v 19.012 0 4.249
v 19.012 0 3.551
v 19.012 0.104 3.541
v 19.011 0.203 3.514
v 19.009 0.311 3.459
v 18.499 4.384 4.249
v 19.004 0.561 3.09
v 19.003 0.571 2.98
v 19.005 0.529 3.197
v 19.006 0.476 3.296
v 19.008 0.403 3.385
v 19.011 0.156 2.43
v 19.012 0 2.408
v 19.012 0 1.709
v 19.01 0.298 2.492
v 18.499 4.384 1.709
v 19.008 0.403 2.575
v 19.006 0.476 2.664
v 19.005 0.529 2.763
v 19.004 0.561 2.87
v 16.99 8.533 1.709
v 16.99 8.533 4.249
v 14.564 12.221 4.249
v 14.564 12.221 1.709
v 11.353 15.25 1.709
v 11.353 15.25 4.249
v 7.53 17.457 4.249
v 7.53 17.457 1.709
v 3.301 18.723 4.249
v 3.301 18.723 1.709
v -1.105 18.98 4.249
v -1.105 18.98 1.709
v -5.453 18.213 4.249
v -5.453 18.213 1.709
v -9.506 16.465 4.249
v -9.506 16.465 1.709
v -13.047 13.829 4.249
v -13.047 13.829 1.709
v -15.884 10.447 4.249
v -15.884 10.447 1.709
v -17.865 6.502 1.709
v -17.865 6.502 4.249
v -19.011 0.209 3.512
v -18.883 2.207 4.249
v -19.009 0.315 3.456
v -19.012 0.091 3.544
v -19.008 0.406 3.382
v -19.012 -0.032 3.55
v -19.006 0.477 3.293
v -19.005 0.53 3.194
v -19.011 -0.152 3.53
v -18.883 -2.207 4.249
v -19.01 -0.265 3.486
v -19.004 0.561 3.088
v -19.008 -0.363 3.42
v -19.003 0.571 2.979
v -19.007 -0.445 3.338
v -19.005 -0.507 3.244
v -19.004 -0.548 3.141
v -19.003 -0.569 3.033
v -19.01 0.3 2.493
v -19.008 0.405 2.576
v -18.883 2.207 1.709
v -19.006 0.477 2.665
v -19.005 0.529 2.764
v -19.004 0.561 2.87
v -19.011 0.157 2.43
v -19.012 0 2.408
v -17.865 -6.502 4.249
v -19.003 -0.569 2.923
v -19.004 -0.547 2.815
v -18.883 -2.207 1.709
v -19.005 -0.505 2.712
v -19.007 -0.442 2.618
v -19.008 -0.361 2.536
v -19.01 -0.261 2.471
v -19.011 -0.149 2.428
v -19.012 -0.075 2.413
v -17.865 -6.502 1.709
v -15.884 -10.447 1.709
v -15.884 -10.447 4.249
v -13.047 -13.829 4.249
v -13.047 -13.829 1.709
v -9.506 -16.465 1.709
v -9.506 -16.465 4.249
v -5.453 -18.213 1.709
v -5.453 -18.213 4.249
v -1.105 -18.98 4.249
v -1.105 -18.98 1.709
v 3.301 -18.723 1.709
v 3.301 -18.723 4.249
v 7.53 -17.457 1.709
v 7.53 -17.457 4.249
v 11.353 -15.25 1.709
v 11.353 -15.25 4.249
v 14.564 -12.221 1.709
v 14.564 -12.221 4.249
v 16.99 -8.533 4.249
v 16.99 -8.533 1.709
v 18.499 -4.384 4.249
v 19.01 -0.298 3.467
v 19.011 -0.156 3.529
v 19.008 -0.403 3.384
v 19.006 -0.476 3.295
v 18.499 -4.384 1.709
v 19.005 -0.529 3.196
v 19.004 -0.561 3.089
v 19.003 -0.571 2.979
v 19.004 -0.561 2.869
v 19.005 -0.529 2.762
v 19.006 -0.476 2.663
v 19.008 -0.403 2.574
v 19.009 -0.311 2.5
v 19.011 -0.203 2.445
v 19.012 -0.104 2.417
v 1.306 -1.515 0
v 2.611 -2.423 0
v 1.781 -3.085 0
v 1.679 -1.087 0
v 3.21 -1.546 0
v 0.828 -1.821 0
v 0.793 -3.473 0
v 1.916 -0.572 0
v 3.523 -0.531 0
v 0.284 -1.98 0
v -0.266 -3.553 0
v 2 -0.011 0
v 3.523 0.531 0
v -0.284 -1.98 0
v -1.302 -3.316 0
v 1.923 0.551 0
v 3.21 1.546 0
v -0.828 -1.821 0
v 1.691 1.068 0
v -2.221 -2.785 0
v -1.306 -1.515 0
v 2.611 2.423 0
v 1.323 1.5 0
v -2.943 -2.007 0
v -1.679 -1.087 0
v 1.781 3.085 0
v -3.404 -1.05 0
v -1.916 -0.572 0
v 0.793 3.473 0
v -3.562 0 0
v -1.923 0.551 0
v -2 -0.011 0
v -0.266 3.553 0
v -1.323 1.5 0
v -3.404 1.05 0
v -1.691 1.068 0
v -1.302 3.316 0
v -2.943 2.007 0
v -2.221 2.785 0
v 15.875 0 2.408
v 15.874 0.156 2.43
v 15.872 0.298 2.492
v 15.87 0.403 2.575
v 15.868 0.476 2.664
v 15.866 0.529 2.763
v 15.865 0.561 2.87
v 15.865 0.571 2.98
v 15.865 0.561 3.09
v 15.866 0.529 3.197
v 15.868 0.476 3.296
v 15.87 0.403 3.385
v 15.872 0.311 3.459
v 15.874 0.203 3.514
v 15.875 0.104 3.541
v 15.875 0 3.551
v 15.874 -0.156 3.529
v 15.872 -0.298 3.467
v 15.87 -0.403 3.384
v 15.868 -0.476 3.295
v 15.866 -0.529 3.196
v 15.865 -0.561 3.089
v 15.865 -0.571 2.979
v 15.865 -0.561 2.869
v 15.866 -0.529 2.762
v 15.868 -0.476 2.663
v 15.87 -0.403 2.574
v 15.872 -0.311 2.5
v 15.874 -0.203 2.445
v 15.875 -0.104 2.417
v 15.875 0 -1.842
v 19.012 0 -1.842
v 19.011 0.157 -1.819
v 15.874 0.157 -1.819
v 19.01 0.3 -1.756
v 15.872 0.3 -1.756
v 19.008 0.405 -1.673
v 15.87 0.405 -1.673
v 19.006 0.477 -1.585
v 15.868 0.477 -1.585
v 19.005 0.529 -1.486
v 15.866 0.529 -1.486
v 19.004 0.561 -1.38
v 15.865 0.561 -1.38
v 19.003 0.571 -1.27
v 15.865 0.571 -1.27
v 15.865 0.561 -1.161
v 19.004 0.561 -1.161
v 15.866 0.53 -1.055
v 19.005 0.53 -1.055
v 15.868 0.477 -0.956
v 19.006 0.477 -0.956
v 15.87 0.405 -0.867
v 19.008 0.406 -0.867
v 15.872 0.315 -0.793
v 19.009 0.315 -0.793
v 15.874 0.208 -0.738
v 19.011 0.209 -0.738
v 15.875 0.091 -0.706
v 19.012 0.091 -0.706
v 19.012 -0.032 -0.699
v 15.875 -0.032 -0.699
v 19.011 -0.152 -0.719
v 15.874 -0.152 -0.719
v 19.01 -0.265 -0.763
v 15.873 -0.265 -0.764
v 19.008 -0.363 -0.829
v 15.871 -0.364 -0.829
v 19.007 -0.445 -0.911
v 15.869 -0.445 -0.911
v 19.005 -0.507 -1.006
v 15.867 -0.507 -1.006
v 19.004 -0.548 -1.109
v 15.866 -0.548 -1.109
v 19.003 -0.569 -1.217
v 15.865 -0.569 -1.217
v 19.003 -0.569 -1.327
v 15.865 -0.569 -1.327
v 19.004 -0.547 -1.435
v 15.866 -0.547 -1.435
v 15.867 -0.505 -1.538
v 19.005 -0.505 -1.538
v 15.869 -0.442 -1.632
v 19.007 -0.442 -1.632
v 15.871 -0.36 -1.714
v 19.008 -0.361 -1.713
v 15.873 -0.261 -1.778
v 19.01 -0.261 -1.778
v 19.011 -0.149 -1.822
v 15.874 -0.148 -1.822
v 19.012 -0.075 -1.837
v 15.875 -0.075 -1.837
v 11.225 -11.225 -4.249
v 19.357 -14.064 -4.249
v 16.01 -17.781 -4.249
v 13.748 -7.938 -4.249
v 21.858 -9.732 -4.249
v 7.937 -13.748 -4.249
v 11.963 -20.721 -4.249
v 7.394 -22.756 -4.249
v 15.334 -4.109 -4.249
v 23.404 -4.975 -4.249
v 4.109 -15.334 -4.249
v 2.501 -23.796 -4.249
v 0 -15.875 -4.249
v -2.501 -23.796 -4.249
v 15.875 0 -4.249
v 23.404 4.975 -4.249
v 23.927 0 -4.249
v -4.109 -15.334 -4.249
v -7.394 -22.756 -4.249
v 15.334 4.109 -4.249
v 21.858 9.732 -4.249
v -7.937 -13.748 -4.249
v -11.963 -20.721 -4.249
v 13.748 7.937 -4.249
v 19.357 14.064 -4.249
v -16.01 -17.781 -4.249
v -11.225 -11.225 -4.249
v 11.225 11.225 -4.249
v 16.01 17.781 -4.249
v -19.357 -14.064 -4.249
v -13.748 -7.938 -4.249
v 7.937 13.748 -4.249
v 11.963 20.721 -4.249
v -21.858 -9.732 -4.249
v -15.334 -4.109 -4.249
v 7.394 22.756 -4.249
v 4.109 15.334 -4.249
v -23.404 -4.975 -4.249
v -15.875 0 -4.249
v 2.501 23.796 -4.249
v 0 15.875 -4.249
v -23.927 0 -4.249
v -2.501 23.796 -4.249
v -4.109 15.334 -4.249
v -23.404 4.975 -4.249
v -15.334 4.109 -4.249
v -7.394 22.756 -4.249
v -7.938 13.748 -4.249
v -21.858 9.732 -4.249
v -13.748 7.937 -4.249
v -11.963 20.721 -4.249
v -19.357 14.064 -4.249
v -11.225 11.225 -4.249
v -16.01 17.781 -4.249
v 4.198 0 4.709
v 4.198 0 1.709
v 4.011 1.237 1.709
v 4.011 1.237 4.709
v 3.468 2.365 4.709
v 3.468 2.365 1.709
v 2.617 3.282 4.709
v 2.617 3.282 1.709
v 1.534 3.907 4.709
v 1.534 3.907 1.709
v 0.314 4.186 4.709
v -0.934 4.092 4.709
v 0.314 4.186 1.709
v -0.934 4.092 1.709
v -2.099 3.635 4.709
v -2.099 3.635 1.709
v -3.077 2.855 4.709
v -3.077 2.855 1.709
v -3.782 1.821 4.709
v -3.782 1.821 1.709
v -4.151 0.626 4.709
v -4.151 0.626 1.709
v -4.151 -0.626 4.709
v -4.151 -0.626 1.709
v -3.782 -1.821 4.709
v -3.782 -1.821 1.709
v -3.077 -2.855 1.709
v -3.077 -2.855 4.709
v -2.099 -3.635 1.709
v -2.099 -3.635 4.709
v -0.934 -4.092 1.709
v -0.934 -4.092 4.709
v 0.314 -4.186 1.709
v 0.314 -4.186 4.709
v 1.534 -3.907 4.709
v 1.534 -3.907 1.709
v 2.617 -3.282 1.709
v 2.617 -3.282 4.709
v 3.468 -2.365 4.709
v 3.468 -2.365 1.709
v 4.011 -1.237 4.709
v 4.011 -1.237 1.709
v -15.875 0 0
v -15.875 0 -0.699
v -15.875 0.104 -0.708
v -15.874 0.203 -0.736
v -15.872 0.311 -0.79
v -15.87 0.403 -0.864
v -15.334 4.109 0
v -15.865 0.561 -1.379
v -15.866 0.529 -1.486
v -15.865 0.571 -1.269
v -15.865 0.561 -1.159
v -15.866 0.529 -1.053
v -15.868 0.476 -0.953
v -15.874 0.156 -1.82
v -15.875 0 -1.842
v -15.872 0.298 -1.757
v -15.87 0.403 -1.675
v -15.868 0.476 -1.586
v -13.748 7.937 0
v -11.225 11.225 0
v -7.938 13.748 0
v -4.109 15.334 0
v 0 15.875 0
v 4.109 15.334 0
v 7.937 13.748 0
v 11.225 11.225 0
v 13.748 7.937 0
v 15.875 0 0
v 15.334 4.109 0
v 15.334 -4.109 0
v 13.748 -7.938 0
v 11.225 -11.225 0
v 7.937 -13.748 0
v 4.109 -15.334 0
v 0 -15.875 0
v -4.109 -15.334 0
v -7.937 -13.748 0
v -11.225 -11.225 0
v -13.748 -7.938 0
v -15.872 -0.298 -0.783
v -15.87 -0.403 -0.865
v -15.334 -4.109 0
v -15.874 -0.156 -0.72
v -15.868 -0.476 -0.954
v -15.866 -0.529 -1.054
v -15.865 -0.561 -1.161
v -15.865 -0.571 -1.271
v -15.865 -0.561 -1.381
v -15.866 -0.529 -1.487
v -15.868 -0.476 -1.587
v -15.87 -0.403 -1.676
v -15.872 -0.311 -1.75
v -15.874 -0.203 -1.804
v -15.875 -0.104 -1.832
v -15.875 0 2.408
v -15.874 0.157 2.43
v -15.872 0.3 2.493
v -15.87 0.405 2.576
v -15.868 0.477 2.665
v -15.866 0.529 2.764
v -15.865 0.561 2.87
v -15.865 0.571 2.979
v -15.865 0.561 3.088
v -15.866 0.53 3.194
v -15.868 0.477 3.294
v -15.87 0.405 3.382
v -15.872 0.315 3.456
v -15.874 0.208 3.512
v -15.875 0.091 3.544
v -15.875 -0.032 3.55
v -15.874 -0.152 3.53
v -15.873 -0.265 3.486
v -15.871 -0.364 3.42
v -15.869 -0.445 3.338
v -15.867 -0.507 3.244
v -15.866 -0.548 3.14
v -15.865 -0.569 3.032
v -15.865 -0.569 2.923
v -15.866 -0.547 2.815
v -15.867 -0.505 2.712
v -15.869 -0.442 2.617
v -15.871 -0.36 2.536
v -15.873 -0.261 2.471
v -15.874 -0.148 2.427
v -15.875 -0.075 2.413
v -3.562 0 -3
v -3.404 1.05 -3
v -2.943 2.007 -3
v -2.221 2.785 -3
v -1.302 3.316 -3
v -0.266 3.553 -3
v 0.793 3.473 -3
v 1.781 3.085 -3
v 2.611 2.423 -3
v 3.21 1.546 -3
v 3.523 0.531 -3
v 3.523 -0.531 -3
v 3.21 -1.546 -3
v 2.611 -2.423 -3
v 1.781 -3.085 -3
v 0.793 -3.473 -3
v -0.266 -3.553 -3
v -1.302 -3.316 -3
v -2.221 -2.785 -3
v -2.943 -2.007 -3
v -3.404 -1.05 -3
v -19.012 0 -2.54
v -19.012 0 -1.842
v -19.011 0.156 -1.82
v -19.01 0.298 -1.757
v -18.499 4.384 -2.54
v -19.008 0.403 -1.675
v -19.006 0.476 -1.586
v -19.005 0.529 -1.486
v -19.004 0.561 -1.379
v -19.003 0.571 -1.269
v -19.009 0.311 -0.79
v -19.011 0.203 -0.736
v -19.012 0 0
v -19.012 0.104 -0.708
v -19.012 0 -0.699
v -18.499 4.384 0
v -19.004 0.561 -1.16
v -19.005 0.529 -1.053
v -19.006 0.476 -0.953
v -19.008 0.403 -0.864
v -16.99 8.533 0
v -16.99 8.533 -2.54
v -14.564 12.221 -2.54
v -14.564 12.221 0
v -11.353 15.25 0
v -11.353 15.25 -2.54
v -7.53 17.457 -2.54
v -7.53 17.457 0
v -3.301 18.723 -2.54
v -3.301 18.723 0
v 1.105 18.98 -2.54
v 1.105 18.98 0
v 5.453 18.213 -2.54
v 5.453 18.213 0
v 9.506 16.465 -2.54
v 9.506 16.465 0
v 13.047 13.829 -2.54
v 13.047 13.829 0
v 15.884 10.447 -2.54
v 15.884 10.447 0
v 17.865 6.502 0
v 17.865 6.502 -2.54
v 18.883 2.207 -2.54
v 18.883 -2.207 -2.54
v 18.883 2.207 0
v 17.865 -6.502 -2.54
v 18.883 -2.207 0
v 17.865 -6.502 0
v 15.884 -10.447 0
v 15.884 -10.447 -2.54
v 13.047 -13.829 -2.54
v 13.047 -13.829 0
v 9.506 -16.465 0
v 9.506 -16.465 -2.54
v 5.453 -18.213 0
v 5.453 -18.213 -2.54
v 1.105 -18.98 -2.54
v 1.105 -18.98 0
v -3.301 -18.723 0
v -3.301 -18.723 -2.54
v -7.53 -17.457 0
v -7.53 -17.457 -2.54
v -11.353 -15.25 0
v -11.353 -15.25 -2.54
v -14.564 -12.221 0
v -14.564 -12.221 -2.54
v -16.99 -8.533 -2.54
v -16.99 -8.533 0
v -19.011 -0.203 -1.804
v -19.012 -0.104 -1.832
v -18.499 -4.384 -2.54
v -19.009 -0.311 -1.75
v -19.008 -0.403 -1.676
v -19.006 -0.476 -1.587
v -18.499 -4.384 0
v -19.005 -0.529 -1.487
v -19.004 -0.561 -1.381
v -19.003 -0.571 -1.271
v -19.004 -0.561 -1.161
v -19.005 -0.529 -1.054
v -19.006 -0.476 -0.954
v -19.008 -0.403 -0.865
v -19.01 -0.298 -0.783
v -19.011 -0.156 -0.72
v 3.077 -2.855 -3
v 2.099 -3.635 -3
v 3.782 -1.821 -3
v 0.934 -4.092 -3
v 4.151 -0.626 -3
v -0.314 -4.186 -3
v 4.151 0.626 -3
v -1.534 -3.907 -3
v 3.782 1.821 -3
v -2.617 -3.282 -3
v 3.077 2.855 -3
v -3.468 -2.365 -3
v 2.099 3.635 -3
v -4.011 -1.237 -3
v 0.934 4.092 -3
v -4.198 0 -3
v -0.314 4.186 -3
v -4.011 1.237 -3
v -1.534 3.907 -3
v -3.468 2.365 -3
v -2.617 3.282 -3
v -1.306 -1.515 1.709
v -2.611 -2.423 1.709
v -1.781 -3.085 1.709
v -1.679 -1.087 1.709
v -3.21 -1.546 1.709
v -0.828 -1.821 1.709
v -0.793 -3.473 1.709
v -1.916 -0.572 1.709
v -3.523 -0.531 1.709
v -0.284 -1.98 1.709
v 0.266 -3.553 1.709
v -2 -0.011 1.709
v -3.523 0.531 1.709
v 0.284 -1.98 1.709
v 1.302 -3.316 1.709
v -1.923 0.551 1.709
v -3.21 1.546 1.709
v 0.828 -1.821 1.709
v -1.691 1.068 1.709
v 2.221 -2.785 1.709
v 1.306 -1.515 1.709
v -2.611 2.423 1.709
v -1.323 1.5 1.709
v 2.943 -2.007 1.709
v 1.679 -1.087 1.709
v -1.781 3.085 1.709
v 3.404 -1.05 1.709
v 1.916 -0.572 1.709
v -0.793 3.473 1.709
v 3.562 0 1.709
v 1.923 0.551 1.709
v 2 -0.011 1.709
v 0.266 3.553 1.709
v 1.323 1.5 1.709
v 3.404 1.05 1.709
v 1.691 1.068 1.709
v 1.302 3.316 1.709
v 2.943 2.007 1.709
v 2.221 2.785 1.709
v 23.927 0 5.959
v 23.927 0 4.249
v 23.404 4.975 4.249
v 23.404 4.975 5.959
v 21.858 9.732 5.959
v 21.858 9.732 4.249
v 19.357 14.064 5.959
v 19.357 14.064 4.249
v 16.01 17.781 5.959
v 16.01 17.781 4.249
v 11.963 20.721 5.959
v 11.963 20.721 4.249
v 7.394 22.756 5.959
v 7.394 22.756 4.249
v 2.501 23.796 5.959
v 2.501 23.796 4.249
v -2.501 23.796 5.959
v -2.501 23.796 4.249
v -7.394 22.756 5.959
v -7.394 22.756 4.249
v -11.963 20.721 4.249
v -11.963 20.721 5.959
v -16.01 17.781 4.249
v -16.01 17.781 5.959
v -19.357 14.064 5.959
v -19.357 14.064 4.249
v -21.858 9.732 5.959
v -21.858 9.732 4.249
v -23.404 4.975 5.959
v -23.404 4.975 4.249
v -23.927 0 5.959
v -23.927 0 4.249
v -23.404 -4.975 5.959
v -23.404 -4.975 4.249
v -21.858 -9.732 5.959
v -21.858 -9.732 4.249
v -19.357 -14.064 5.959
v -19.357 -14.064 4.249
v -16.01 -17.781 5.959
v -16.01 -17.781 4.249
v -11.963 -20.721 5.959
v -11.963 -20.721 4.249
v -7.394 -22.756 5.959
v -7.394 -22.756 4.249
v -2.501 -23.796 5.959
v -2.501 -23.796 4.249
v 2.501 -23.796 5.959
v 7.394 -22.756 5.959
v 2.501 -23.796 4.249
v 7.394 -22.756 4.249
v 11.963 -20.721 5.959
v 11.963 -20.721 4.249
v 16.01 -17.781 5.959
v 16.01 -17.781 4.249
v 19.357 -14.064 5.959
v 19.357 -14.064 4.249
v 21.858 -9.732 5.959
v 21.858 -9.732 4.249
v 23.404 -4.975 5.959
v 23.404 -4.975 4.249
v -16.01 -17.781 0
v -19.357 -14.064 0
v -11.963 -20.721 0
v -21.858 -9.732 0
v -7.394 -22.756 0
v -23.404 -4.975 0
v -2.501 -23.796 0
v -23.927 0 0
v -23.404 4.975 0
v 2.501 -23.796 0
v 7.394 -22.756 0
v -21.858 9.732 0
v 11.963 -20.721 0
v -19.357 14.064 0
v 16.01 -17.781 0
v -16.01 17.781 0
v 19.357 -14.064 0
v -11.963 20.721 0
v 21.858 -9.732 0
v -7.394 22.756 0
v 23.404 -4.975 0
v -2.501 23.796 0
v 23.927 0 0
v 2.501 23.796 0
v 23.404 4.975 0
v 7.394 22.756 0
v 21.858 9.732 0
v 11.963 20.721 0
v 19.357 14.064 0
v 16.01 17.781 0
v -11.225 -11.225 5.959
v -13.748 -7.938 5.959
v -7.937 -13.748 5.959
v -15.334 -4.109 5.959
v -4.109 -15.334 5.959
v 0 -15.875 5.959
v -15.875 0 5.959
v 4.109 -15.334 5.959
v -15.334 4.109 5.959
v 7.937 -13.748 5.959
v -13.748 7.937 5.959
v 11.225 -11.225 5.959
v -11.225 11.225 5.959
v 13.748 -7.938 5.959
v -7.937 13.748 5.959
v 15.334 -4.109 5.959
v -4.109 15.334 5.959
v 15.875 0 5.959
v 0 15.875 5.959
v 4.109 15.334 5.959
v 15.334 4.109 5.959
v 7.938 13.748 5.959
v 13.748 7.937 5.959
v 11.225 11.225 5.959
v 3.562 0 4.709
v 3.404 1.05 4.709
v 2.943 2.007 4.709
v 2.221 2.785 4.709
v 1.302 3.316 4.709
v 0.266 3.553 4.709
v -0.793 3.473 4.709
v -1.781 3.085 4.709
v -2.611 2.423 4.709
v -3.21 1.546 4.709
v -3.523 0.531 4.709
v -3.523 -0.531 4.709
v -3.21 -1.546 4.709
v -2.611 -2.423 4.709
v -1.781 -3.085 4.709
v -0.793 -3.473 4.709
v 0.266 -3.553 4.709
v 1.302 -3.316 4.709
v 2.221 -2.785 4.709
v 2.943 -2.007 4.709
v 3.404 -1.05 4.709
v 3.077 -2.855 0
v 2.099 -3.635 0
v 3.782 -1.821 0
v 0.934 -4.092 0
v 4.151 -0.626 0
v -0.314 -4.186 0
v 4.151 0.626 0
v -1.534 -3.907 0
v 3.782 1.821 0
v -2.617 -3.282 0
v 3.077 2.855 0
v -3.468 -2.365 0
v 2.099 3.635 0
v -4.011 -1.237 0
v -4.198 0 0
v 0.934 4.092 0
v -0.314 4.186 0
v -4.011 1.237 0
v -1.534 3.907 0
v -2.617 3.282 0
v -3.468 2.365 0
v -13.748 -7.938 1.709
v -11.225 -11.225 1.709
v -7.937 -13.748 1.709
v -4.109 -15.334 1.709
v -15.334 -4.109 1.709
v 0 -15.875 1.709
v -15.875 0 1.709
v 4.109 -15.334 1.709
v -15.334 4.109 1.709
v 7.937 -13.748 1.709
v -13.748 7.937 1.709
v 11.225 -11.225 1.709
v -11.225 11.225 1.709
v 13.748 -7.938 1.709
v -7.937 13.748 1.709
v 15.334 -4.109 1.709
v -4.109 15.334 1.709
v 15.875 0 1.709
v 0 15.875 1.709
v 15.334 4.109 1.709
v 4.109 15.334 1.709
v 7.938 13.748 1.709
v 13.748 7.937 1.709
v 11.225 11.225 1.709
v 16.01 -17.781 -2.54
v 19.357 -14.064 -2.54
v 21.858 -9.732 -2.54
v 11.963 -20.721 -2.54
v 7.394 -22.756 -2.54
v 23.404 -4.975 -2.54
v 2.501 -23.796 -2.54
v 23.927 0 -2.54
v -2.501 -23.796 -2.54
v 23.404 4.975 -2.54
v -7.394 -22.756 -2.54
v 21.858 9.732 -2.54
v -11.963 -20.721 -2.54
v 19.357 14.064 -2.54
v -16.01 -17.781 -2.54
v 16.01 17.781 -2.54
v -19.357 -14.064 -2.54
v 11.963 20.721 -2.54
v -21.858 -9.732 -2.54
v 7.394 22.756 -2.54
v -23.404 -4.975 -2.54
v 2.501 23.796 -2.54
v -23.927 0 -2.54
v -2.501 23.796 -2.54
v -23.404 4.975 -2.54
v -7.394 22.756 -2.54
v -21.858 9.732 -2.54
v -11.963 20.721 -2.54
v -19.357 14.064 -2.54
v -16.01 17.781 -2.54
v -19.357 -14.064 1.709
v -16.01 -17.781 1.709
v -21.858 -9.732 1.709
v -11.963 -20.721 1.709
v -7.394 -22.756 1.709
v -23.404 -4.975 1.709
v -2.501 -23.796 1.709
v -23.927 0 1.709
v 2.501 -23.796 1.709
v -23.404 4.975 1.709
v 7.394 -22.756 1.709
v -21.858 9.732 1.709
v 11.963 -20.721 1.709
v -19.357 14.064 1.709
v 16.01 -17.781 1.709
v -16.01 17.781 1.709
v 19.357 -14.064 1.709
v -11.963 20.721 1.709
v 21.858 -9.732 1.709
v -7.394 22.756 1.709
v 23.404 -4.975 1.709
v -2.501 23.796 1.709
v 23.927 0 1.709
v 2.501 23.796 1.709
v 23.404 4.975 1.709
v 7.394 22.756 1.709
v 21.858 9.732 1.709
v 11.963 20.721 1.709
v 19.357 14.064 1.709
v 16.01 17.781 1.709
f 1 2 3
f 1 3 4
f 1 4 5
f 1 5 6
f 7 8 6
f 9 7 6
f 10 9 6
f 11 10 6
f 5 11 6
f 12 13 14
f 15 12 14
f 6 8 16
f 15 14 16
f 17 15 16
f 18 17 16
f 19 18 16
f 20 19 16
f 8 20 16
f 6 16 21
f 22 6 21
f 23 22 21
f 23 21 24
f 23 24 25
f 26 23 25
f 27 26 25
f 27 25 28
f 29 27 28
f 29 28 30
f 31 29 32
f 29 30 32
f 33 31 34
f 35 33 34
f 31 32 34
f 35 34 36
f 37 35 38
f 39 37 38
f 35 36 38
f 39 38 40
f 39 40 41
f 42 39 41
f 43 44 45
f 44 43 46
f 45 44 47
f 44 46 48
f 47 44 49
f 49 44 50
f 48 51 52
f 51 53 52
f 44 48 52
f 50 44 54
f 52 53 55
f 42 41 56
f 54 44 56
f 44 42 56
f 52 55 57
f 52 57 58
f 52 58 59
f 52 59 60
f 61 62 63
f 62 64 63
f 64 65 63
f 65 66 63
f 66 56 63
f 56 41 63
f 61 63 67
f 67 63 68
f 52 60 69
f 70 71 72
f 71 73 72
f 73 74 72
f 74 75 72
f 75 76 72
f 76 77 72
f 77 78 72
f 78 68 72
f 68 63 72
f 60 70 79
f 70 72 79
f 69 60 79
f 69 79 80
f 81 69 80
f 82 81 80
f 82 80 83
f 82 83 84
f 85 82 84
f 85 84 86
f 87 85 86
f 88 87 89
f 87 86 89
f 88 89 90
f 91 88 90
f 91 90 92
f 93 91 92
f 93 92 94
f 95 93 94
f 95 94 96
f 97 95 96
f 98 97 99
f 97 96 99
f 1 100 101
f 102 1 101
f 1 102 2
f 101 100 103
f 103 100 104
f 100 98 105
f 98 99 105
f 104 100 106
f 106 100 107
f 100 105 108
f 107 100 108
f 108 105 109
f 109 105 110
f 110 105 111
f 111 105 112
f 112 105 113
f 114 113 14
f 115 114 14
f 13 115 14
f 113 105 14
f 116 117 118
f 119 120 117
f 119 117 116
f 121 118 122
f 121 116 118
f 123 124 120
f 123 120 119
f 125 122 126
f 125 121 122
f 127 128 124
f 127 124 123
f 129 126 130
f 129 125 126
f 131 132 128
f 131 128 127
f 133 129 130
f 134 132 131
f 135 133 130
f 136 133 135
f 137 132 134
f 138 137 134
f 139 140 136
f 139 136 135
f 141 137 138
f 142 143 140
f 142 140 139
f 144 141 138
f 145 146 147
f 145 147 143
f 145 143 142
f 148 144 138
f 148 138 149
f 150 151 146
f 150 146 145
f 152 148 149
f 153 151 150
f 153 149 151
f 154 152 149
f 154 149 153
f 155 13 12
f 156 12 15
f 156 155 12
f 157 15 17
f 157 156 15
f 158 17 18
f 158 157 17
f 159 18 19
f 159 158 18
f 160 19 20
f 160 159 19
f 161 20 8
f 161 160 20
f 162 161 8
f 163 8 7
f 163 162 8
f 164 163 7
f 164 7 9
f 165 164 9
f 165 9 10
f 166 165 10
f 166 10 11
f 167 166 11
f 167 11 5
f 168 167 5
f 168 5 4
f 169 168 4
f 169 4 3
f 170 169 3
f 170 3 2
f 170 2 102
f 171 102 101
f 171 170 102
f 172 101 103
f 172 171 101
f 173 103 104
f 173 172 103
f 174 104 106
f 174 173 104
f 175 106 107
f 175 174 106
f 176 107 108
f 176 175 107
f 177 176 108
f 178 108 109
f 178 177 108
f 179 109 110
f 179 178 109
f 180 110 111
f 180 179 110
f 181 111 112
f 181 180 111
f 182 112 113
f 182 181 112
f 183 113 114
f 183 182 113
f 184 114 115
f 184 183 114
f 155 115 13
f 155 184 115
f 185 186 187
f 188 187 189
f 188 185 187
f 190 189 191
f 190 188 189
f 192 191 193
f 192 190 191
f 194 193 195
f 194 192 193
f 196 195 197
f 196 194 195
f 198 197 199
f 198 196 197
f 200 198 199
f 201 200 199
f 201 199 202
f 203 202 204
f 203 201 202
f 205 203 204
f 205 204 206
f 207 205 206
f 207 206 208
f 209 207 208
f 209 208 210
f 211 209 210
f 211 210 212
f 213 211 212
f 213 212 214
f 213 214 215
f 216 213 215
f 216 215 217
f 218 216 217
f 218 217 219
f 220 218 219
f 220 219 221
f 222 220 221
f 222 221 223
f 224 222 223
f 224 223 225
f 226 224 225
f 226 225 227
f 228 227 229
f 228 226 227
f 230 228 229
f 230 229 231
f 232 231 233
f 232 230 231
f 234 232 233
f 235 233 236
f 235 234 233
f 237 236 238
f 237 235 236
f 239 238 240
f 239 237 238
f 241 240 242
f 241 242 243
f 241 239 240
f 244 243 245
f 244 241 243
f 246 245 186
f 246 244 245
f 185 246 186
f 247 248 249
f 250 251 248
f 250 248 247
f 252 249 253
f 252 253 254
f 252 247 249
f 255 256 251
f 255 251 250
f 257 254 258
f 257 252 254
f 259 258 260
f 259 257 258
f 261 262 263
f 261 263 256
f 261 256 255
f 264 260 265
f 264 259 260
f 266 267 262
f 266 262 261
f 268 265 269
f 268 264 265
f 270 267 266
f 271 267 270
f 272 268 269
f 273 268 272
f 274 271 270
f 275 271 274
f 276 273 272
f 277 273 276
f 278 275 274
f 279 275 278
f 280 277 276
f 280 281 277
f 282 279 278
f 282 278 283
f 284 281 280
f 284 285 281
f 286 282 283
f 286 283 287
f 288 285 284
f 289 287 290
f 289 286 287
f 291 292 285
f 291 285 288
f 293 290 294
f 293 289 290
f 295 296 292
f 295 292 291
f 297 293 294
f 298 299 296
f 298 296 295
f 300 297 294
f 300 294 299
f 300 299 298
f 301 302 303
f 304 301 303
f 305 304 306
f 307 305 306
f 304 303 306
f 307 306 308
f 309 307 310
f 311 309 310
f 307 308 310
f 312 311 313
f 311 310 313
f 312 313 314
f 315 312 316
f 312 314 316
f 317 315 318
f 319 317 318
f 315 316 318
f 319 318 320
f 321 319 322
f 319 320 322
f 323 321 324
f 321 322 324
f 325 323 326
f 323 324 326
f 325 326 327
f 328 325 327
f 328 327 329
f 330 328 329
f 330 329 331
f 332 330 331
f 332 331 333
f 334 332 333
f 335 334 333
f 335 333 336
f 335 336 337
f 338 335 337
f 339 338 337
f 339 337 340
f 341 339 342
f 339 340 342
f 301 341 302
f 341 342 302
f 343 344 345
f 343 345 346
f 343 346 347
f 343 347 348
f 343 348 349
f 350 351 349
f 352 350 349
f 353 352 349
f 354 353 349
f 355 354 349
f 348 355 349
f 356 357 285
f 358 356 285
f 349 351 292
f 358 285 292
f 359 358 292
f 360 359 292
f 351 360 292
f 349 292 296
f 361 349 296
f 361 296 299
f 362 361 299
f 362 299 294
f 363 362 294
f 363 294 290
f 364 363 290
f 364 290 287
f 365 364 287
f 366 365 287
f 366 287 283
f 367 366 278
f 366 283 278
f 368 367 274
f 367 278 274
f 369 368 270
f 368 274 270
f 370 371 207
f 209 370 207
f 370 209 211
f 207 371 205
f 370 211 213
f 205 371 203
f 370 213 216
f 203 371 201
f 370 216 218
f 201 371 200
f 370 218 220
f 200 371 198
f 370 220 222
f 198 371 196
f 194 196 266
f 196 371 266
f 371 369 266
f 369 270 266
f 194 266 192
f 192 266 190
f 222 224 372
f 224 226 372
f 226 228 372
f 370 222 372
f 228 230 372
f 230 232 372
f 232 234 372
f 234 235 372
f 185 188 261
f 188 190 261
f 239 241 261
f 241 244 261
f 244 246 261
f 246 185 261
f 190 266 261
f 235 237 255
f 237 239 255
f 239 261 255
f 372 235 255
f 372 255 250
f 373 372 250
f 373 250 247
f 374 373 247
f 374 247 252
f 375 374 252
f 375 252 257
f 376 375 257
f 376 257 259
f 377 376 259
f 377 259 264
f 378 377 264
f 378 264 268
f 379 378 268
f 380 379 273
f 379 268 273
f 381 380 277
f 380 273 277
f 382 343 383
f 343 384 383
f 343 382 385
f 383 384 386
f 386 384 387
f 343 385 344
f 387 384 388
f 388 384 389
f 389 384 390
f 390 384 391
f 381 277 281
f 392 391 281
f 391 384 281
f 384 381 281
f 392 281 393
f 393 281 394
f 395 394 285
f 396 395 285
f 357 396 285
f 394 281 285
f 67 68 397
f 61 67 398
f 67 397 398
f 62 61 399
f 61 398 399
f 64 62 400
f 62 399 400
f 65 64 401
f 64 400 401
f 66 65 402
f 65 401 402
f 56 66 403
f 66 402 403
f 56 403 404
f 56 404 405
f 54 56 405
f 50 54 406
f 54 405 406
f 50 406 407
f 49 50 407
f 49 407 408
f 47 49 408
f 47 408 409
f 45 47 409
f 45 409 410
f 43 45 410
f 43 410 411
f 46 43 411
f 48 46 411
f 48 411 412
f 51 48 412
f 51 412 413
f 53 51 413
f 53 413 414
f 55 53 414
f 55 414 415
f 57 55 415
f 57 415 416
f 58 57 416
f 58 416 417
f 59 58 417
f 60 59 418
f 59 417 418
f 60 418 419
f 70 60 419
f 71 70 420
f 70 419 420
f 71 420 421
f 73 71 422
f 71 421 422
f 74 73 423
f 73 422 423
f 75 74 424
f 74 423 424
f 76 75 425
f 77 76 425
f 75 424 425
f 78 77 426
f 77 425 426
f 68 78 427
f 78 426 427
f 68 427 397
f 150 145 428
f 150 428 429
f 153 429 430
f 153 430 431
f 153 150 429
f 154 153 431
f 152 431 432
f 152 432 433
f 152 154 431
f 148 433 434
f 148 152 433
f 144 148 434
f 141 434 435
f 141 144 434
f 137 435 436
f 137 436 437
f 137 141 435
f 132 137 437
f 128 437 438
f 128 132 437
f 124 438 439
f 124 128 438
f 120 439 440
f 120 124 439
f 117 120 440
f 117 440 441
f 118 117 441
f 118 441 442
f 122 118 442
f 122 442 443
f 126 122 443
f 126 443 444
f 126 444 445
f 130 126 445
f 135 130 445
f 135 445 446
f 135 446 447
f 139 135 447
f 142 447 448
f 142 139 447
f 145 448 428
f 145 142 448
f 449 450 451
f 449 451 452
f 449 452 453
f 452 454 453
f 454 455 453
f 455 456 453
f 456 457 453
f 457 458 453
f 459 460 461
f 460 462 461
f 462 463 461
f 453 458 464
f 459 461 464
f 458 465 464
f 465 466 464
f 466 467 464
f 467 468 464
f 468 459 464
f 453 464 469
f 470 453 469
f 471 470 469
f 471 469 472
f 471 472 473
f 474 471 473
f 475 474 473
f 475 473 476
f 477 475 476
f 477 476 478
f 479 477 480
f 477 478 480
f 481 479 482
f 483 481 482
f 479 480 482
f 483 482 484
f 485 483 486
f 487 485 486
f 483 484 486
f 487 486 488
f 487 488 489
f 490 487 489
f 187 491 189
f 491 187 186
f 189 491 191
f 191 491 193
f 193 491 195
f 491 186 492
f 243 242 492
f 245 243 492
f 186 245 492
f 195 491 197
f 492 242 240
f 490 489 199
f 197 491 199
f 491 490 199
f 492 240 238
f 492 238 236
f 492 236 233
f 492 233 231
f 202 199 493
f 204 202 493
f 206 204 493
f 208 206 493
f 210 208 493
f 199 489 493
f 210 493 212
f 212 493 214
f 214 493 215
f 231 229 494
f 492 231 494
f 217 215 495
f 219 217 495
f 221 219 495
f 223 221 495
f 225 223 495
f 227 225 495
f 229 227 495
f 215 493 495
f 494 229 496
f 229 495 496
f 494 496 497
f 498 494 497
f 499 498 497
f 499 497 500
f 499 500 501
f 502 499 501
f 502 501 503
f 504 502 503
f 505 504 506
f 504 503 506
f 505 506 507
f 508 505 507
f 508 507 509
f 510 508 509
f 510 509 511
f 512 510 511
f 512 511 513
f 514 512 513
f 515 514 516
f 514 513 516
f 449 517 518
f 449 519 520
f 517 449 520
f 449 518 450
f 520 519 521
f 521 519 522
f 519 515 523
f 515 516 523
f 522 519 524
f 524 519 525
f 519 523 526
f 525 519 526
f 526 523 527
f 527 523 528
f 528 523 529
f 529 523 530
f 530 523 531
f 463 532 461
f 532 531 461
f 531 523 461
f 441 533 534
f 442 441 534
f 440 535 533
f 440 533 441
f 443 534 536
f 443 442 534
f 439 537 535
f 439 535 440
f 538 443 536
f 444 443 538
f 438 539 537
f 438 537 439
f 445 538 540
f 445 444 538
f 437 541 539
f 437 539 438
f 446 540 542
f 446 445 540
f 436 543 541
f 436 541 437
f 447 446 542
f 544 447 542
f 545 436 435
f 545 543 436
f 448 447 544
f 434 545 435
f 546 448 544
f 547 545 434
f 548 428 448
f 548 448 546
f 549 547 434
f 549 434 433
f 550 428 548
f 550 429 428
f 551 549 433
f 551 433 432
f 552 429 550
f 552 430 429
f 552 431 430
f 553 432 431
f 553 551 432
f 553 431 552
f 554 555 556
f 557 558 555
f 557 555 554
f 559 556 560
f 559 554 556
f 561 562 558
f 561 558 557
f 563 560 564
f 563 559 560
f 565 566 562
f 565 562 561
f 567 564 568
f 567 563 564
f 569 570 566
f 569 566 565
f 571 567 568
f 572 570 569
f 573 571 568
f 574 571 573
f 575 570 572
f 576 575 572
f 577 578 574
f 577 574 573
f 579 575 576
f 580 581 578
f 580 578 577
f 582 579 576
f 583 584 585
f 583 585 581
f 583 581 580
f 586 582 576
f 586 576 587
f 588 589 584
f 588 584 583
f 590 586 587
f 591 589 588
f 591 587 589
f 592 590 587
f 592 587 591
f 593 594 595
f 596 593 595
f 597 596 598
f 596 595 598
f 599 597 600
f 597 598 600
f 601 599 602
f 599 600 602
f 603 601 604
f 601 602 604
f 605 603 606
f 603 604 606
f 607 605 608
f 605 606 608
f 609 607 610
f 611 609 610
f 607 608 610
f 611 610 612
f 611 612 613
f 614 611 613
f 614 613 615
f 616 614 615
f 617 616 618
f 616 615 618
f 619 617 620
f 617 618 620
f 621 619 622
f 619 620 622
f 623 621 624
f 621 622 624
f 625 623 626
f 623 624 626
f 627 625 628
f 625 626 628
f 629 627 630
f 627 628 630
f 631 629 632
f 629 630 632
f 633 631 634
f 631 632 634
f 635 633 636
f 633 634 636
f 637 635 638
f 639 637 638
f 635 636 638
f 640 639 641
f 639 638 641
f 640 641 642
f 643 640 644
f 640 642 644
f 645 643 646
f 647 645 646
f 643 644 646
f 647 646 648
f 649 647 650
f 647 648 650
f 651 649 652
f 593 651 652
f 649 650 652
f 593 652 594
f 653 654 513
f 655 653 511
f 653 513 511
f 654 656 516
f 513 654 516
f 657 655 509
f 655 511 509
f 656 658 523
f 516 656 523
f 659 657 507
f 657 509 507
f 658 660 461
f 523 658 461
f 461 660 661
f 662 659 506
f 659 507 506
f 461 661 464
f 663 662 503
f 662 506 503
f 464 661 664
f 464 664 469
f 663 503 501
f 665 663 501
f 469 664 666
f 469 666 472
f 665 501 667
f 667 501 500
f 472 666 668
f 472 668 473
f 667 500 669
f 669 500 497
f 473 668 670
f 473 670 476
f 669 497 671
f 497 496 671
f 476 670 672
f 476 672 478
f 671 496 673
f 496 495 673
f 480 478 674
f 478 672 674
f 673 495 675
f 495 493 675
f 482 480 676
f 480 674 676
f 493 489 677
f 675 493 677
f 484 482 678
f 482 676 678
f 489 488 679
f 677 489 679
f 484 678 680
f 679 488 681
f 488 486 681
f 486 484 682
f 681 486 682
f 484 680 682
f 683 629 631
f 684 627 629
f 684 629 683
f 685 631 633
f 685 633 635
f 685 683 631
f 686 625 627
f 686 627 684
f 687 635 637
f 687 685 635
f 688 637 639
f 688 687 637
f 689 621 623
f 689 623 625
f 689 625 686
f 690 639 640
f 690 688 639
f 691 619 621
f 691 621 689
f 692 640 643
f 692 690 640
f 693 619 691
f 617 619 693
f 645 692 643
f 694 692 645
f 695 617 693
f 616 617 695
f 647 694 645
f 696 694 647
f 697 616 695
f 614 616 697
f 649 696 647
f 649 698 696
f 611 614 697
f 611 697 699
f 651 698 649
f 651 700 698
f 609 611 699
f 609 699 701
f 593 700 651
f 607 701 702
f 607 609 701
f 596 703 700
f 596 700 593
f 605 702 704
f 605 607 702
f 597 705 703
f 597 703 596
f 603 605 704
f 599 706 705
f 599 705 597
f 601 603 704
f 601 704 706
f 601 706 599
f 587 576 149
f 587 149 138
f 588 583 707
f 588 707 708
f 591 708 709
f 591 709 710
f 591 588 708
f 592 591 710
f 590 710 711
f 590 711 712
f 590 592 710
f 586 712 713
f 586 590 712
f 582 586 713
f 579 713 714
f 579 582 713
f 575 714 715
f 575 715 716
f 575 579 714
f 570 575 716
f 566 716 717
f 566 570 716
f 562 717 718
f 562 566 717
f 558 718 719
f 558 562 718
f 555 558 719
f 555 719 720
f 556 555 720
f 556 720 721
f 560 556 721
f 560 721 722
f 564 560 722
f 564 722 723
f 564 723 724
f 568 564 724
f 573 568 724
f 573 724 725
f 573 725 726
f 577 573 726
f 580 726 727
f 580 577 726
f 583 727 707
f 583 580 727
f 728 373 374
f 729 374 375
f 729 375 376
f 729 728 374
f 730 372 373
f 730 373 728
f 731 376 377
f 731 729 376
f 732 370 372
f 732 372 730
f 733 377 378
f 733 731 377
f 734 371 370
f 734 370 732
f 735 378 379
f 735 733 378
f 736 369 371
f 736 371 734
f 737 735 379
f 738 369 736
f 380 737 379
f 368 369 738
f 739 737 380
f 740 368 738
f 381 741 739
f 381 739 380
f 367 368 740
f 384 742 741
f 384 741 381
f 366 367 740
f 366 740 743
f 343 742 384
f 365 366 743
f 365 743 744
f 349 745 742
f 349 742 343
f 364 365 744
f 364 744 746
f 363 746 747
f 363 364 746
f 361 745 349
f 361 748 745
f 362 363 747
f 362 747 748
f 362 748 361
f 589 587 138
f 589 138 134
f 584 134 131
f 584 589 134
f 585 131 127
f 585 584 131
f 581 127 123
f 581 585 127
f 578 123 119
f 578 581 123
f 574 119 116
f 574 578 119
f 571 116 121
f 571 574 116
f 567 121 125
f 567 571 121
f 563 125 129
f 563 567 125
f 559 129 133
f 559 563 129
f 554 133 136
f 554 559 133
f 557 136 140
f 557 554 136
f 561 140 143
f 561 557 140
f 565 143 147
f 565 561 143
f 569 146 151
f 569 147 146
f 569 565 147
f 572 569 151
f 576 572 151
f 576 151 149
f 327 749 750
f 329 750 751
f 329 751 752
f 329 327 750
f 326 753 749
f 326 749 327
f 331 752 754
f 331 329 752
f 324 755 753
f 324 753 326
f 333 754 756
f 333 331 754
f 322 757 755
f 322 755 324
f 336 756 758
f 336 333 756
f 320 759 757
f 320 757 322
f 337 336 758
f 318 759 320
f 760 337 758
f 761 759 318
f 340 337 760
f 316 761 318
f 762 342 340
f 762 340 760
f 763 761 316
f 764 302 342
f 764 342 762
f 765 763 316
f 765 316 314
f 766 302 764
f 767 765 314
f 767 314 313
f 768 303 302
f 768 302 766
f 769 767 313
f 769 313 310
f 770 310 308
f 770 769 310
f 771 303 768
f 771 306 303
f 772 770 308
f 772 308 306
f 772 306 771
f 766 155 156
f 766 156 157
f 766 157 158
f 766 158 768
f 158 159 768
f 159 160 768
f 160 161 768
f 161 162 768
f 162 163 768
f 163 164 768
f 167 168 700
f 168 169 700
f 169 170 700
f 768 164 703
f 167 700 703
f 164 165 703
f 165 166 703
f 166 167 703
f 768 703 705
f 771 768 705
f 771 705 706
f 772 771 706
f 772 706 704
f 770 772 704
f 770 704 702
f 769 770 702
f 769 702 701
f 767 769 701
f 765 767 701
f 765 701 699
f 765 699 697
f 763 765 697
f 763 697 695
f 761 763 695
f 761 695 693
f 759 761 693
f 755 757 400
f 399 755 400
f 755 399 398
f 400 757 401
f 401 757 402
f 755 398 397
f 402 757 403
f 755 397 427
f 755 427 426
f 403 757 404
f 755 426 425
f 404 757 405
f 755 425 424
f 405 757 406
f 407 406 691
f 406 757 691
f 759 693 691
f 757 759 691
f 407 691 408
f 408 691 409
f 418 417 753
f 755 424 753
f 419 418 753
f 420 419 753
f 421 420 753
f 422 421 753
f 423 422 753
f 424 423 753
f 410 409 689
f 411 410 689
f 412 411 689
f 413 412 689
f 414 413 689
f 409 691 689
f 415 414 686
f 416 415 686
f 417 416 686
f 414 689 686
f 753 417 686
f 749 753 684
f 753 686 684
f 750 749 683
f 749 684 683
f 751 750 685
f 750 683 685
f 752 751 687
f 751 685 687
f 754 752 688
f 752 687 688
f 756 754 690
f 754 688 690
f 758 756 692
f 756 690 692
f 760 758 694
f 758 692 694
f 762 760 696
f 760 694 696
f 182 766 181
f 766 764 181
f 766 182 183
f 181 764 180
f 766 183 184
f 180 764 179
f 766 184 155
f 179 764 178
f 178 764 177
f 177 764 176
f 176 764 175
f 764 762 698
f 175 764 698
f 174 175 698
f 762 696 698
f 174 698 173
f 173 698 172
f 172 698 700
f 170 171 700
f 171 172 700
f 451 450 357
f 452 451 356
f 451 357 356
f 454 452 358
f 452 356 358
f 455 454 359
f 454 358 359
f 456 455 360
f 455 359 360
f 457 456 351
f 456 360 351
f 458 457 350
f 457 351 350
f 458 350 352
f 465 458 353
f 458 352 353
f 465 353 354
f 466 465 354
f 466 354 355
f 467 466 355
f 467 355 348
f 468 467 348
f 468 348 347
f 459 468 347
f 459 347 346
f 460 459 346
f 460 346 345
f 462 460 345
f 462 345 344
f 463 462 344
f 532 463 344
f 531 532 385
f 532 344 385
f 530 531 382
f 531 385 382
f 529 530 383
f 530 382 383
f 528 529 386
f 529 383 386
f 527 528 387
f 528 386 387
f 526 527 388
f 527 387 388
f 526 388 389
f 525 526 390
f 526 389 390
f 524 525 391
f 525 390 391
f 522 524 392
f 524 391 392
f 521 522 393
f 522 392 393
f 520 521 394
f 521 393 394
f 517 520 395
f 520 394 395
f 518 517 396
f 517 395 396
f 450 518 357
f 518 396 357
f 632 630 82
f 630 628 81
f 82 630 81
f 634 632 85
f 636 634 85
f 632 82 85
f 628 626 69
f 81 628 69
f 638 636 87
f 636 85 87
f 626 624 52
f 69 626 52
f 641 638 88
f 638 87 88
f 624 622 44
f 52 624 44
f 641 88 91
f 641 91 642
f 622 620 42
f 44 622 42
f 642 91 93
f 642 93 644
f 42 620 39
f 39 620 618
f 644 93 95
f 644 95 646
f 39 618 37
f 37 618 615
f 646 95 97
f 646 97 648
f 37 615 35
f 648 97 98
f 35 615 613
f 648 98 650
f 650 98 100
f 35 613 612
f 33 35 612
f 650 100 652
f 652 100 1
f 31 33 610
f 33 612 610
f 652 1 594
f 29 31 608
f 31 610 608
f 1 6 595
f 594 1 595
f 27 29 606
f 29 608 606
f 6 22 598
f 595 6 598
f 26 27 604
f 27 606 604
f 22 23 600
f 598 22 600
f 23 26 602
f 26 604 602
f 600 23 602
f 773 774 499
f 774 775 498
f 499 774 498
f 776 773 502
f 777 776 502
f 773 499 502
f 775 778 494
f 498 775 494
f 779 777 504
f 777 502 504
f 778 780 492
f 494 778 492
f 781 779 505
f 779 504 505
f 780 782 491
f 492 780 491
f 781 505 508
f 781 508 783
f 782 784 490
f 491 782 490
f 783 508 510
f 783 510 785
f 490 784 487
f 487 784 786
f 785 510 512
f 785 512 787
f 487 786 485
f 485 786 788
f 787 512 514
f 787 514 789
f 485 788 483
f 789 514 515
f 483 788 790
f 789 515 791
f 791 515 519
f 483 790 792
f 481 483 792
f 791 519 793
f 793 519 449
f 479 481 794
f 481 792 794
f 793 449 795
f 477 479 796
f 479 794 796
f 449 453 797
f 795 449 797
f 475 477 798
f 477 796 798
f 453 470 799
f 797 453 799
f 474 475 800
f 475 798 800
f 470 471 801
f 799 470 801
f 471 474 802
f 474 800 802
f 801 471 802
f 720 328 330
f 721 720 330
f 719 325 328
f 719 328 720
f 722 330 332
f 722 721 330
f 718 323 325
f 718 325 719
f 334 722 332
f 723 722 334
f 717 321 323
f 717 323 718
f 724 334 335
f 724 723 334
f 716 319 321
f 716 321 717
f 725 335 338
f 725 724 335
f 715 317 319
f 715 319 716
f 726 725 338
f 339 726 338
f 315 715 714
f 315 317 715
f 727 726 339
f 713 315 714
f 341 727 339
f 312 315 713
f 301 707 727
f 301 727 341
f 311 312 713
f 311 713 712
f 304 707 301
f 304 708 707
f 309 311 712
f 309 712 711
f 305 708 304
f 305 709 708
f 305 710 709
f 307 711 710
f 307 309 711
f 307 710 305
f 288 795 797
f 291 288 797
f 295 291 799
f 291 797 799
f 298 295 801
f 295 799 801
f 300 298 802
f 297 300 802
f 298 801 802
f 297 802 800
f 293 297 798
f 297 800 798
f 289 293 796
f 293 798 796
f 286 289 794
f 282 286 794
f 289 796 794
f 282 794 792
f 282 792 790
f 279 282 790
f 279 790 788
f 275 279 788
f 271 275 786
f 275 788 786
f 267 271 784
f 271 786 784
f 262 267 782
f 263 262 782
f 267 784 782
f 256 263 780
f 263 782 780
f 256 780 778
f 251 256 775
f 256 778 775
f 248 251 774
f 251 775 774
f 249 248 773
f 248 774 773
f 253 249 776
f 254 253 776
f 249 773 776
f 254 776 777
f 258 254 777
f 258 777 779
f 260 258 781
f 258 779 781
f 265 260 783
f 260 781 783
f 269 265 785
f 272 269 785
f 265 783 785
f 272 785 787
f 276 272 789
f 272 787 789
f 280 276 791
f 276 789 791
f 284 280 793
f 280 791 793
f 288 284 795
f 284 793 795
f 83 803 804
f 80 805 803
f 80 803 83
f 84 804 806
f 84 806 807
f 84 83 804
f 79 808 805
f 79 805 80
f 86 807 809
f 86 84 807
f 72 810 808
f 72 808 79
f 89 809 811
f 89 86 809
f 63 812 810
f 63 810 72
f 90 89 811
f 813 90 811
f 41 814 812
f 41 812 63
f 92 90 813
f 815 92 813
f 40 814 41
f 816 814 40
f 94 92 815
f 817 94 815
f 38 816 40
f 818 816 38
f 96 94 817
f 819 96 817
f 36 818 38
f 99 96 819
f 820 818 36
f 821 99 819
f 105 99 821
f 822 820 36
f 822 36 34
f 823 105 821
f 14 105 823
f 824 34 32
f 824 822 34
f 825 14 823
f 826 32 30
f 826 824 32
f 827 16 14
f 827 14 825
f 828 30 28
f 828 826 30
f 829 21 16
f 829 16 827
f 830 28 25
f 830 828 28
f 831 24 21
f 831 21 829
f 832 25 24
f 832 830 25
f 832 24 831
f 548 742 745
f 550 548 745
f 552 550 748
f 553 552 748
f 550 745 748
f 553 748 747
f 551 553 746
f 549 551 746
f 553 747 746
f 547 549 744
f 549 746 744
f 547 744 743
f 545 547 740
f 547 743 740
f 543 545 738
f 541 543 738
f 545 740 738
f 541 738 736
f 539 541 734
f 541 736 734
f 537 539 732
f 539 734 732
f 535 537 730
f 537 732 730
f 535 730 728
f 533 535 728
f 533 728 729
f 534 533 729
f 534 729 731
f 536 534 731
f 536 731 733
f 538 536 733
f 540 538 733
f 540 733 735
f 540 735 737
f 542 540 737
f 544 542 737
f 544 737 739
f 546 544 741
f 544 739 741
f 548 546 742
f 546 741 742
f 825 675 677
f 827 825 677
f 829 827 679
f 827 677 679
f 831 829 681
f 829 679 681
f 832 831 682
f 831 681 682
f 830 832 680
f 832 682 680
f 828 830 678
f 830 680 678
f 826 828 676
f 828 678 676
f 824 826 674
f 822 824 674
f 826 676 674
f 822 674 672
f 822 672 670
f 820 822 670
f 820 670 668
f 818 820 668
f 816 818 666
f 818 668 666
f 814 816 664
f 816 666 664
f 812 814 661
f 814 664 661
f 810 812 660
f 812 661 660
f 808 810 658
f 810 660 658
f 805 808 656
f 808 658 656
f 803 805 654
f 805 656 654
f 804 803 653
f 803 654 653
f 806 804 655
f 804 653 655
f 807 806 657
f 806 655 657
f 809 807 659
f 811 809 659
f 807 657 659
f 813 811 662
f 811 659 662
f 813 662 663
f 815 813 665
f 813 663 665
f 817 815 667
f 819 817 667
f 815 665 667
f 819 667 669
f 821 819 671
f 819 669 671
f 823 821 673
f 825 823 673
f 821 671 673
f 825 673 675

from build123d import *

# Parameters (mm, degrees)
SKETCH1_R               = 23.9268
BOSS_EXTRUDE1_DEPTH     = 1.70942
SKETCH2_R               = 19.0119
BOSS_EXTRUDE2_DEPTH     = 2.54
SKETCH3_R               = 19.0119
BOSS_EXTRUDE3_DEPTH     = 2.54
SKETCH4_R               = 23.9268
BOSS_EXTRUDE4_DEPTH     = 1.70942
SKETCH5_R               = 23.9268
BOSS_EXTRUDE5_DEPTH     = 1.70942
SKETCH6_R               = 15.875
CUT_EXTRUDE1_DEPTH      = 4.24942
SKETCH7_R               = 15.875
CUT_EXTRUDE2_DEPTH      = 4.24942
SKETCH8_R               = 0.5715
CUT_EXTRUDE3_DEPTH      = 24.9268
CUT_EXTRUDE3_DEPTH_BACK = 24.9268
CUT_EXTRUDE4_DEPTH      = 6.9588401
SKETCH10_R              = 4.1975
SKETCH10_R_2            = 3.5625
BOSS_EXTRUDE7_DEPTH     = 3
SKETCH11_R              = 4.1975
SKETCH11_R_2            = 3.5625
BOSS_EXTRUDE8_DEPTH     = 3


with BuildPart() as part:
    # Sketch1 → Boss-Extrude1 (new body)
    with BuildSketch(Plane.XY):
        Circle(SKETCH1_R)
    extrude(amount=BOSS_EXTRUDE1_DEPTH)

    # Sketch2 → Boss-Extrude2 (add)
    with BuildSketch(Plane.XY.offset(1.70942)):
        Circle(SKETCH2_R)
    extrude(amount=BOSS_EXTRUDE2_DEPTH)

    # Sketch3 → Boss-Extrude3 (add)
    with BuildSketch(Plane(origin=(0, 0, 0), x_dir=(-1, 0, 0), z_dir=(0, 0, -1))):
        Circle(SKETCH3_R)
    extrude(amount=BOSS_EXTRUDE3_DEPTH)

    # Sketch4 → Boss-Extrude4 (add)
    with BuildSketch(Plane.XY.offset(4.24942)):
        Circle(SKETCH4_R)
    extrude(amount=BOSS_EXTRUDE4_DEPTH)

    # Sketch5 → Boss-Extrude5 (add)
    with BuildSketch(Plane(origin=(0, 0, -2.54), x_dir=(-1, 0, 0), z_dir=(0, 0, -1))):
        Circle(SKETCH5_R)
    extrude(amount=BOSS_EXTRUDE5_DEPTH)

    # Sketch6 → Cut-Extrude1 (cut)
    with BuildSketch(Plane.XY.offset(5.95884)):
        Circle(SKETCH6_R)
    extrude(amount=-CUT_EXTRUDE1_DEPTH, mode=Mode.SUBTRACT)

    # Sketch7 → Cut-Extrude2 (cut)
    with BuildSketch(Plane(origin=(0, 0, -4.24942), x_dir=(-1, 0, 0), z_dir=(0, 0, -1))):
        Circle(SKETCH7_R)
    extrude(amount=-CUT_EXTRUDE2_DEPTH, mode=Mode.SUBTRACT)

    # Sketch8 → Cut-Extrude3 (cut, two sides)
    with BuildSketch(Plane(origin=(0, 0, 0), x_dir=(0, 0, -1), z_dir=(1, 0, 0))) as cut_extrude3_sk:
        with Locations((-2.97942, 0)):
            Circle(SKETCH8_R)
        with Locations((1.27, 0)):
            Circle(SKETCH8_R)
    extrude(amount=CUT_EXTRUDE3_DEPTH, mode=Mode.SUBTRACT)
    extrude(cut_extrude3_sk.sketch, amount=-CUT_EXTRUDE3_DEPTH_BACK, mode=Mode.SUBTRACT)

    # Sketch9 → Cut-Extrude4 (cut, through all)
    with BuildSketch(Plane.XY.offset(1.70942)):
        with BuildLine():
            Line((-1.322875656, 1.5), (1.322875656, 1.5))
            ThreePointArc((1.322875656, 1.5), (0, -2), (-1.322875656, 1.5))
        make_face()
    extrude(amount=-CUT_EXTRUDE4_DEPTH, mode=Mode.SUBTRACT)

    # Sketch10 → Boss-Extrude7 (add)
    with BuildSketch(Plane.XY.offset(1.70942)):
        Circle(SKETCH10_R)
        Circle(SKETCH10_R_2, mode=Mode.SUBTRACT)
    extrude(amount=BOSS_EXTRUDE7_DEPTH)

    # Sketch11 → Boss-Extrude8 (add)
    with BuildSketch(Plane(origin=(0, 0, 0), x_dir=(-1, 0, 0), z_dir=(0, 0, -1))):
        Circle(SKETCH11_R)
        Circle(SKETCH11_R_2, mode=Mode.SUBTRACT)
    extrude(amount=BOSS_EXTRUDE8_DEPTH)


solid = part.part
